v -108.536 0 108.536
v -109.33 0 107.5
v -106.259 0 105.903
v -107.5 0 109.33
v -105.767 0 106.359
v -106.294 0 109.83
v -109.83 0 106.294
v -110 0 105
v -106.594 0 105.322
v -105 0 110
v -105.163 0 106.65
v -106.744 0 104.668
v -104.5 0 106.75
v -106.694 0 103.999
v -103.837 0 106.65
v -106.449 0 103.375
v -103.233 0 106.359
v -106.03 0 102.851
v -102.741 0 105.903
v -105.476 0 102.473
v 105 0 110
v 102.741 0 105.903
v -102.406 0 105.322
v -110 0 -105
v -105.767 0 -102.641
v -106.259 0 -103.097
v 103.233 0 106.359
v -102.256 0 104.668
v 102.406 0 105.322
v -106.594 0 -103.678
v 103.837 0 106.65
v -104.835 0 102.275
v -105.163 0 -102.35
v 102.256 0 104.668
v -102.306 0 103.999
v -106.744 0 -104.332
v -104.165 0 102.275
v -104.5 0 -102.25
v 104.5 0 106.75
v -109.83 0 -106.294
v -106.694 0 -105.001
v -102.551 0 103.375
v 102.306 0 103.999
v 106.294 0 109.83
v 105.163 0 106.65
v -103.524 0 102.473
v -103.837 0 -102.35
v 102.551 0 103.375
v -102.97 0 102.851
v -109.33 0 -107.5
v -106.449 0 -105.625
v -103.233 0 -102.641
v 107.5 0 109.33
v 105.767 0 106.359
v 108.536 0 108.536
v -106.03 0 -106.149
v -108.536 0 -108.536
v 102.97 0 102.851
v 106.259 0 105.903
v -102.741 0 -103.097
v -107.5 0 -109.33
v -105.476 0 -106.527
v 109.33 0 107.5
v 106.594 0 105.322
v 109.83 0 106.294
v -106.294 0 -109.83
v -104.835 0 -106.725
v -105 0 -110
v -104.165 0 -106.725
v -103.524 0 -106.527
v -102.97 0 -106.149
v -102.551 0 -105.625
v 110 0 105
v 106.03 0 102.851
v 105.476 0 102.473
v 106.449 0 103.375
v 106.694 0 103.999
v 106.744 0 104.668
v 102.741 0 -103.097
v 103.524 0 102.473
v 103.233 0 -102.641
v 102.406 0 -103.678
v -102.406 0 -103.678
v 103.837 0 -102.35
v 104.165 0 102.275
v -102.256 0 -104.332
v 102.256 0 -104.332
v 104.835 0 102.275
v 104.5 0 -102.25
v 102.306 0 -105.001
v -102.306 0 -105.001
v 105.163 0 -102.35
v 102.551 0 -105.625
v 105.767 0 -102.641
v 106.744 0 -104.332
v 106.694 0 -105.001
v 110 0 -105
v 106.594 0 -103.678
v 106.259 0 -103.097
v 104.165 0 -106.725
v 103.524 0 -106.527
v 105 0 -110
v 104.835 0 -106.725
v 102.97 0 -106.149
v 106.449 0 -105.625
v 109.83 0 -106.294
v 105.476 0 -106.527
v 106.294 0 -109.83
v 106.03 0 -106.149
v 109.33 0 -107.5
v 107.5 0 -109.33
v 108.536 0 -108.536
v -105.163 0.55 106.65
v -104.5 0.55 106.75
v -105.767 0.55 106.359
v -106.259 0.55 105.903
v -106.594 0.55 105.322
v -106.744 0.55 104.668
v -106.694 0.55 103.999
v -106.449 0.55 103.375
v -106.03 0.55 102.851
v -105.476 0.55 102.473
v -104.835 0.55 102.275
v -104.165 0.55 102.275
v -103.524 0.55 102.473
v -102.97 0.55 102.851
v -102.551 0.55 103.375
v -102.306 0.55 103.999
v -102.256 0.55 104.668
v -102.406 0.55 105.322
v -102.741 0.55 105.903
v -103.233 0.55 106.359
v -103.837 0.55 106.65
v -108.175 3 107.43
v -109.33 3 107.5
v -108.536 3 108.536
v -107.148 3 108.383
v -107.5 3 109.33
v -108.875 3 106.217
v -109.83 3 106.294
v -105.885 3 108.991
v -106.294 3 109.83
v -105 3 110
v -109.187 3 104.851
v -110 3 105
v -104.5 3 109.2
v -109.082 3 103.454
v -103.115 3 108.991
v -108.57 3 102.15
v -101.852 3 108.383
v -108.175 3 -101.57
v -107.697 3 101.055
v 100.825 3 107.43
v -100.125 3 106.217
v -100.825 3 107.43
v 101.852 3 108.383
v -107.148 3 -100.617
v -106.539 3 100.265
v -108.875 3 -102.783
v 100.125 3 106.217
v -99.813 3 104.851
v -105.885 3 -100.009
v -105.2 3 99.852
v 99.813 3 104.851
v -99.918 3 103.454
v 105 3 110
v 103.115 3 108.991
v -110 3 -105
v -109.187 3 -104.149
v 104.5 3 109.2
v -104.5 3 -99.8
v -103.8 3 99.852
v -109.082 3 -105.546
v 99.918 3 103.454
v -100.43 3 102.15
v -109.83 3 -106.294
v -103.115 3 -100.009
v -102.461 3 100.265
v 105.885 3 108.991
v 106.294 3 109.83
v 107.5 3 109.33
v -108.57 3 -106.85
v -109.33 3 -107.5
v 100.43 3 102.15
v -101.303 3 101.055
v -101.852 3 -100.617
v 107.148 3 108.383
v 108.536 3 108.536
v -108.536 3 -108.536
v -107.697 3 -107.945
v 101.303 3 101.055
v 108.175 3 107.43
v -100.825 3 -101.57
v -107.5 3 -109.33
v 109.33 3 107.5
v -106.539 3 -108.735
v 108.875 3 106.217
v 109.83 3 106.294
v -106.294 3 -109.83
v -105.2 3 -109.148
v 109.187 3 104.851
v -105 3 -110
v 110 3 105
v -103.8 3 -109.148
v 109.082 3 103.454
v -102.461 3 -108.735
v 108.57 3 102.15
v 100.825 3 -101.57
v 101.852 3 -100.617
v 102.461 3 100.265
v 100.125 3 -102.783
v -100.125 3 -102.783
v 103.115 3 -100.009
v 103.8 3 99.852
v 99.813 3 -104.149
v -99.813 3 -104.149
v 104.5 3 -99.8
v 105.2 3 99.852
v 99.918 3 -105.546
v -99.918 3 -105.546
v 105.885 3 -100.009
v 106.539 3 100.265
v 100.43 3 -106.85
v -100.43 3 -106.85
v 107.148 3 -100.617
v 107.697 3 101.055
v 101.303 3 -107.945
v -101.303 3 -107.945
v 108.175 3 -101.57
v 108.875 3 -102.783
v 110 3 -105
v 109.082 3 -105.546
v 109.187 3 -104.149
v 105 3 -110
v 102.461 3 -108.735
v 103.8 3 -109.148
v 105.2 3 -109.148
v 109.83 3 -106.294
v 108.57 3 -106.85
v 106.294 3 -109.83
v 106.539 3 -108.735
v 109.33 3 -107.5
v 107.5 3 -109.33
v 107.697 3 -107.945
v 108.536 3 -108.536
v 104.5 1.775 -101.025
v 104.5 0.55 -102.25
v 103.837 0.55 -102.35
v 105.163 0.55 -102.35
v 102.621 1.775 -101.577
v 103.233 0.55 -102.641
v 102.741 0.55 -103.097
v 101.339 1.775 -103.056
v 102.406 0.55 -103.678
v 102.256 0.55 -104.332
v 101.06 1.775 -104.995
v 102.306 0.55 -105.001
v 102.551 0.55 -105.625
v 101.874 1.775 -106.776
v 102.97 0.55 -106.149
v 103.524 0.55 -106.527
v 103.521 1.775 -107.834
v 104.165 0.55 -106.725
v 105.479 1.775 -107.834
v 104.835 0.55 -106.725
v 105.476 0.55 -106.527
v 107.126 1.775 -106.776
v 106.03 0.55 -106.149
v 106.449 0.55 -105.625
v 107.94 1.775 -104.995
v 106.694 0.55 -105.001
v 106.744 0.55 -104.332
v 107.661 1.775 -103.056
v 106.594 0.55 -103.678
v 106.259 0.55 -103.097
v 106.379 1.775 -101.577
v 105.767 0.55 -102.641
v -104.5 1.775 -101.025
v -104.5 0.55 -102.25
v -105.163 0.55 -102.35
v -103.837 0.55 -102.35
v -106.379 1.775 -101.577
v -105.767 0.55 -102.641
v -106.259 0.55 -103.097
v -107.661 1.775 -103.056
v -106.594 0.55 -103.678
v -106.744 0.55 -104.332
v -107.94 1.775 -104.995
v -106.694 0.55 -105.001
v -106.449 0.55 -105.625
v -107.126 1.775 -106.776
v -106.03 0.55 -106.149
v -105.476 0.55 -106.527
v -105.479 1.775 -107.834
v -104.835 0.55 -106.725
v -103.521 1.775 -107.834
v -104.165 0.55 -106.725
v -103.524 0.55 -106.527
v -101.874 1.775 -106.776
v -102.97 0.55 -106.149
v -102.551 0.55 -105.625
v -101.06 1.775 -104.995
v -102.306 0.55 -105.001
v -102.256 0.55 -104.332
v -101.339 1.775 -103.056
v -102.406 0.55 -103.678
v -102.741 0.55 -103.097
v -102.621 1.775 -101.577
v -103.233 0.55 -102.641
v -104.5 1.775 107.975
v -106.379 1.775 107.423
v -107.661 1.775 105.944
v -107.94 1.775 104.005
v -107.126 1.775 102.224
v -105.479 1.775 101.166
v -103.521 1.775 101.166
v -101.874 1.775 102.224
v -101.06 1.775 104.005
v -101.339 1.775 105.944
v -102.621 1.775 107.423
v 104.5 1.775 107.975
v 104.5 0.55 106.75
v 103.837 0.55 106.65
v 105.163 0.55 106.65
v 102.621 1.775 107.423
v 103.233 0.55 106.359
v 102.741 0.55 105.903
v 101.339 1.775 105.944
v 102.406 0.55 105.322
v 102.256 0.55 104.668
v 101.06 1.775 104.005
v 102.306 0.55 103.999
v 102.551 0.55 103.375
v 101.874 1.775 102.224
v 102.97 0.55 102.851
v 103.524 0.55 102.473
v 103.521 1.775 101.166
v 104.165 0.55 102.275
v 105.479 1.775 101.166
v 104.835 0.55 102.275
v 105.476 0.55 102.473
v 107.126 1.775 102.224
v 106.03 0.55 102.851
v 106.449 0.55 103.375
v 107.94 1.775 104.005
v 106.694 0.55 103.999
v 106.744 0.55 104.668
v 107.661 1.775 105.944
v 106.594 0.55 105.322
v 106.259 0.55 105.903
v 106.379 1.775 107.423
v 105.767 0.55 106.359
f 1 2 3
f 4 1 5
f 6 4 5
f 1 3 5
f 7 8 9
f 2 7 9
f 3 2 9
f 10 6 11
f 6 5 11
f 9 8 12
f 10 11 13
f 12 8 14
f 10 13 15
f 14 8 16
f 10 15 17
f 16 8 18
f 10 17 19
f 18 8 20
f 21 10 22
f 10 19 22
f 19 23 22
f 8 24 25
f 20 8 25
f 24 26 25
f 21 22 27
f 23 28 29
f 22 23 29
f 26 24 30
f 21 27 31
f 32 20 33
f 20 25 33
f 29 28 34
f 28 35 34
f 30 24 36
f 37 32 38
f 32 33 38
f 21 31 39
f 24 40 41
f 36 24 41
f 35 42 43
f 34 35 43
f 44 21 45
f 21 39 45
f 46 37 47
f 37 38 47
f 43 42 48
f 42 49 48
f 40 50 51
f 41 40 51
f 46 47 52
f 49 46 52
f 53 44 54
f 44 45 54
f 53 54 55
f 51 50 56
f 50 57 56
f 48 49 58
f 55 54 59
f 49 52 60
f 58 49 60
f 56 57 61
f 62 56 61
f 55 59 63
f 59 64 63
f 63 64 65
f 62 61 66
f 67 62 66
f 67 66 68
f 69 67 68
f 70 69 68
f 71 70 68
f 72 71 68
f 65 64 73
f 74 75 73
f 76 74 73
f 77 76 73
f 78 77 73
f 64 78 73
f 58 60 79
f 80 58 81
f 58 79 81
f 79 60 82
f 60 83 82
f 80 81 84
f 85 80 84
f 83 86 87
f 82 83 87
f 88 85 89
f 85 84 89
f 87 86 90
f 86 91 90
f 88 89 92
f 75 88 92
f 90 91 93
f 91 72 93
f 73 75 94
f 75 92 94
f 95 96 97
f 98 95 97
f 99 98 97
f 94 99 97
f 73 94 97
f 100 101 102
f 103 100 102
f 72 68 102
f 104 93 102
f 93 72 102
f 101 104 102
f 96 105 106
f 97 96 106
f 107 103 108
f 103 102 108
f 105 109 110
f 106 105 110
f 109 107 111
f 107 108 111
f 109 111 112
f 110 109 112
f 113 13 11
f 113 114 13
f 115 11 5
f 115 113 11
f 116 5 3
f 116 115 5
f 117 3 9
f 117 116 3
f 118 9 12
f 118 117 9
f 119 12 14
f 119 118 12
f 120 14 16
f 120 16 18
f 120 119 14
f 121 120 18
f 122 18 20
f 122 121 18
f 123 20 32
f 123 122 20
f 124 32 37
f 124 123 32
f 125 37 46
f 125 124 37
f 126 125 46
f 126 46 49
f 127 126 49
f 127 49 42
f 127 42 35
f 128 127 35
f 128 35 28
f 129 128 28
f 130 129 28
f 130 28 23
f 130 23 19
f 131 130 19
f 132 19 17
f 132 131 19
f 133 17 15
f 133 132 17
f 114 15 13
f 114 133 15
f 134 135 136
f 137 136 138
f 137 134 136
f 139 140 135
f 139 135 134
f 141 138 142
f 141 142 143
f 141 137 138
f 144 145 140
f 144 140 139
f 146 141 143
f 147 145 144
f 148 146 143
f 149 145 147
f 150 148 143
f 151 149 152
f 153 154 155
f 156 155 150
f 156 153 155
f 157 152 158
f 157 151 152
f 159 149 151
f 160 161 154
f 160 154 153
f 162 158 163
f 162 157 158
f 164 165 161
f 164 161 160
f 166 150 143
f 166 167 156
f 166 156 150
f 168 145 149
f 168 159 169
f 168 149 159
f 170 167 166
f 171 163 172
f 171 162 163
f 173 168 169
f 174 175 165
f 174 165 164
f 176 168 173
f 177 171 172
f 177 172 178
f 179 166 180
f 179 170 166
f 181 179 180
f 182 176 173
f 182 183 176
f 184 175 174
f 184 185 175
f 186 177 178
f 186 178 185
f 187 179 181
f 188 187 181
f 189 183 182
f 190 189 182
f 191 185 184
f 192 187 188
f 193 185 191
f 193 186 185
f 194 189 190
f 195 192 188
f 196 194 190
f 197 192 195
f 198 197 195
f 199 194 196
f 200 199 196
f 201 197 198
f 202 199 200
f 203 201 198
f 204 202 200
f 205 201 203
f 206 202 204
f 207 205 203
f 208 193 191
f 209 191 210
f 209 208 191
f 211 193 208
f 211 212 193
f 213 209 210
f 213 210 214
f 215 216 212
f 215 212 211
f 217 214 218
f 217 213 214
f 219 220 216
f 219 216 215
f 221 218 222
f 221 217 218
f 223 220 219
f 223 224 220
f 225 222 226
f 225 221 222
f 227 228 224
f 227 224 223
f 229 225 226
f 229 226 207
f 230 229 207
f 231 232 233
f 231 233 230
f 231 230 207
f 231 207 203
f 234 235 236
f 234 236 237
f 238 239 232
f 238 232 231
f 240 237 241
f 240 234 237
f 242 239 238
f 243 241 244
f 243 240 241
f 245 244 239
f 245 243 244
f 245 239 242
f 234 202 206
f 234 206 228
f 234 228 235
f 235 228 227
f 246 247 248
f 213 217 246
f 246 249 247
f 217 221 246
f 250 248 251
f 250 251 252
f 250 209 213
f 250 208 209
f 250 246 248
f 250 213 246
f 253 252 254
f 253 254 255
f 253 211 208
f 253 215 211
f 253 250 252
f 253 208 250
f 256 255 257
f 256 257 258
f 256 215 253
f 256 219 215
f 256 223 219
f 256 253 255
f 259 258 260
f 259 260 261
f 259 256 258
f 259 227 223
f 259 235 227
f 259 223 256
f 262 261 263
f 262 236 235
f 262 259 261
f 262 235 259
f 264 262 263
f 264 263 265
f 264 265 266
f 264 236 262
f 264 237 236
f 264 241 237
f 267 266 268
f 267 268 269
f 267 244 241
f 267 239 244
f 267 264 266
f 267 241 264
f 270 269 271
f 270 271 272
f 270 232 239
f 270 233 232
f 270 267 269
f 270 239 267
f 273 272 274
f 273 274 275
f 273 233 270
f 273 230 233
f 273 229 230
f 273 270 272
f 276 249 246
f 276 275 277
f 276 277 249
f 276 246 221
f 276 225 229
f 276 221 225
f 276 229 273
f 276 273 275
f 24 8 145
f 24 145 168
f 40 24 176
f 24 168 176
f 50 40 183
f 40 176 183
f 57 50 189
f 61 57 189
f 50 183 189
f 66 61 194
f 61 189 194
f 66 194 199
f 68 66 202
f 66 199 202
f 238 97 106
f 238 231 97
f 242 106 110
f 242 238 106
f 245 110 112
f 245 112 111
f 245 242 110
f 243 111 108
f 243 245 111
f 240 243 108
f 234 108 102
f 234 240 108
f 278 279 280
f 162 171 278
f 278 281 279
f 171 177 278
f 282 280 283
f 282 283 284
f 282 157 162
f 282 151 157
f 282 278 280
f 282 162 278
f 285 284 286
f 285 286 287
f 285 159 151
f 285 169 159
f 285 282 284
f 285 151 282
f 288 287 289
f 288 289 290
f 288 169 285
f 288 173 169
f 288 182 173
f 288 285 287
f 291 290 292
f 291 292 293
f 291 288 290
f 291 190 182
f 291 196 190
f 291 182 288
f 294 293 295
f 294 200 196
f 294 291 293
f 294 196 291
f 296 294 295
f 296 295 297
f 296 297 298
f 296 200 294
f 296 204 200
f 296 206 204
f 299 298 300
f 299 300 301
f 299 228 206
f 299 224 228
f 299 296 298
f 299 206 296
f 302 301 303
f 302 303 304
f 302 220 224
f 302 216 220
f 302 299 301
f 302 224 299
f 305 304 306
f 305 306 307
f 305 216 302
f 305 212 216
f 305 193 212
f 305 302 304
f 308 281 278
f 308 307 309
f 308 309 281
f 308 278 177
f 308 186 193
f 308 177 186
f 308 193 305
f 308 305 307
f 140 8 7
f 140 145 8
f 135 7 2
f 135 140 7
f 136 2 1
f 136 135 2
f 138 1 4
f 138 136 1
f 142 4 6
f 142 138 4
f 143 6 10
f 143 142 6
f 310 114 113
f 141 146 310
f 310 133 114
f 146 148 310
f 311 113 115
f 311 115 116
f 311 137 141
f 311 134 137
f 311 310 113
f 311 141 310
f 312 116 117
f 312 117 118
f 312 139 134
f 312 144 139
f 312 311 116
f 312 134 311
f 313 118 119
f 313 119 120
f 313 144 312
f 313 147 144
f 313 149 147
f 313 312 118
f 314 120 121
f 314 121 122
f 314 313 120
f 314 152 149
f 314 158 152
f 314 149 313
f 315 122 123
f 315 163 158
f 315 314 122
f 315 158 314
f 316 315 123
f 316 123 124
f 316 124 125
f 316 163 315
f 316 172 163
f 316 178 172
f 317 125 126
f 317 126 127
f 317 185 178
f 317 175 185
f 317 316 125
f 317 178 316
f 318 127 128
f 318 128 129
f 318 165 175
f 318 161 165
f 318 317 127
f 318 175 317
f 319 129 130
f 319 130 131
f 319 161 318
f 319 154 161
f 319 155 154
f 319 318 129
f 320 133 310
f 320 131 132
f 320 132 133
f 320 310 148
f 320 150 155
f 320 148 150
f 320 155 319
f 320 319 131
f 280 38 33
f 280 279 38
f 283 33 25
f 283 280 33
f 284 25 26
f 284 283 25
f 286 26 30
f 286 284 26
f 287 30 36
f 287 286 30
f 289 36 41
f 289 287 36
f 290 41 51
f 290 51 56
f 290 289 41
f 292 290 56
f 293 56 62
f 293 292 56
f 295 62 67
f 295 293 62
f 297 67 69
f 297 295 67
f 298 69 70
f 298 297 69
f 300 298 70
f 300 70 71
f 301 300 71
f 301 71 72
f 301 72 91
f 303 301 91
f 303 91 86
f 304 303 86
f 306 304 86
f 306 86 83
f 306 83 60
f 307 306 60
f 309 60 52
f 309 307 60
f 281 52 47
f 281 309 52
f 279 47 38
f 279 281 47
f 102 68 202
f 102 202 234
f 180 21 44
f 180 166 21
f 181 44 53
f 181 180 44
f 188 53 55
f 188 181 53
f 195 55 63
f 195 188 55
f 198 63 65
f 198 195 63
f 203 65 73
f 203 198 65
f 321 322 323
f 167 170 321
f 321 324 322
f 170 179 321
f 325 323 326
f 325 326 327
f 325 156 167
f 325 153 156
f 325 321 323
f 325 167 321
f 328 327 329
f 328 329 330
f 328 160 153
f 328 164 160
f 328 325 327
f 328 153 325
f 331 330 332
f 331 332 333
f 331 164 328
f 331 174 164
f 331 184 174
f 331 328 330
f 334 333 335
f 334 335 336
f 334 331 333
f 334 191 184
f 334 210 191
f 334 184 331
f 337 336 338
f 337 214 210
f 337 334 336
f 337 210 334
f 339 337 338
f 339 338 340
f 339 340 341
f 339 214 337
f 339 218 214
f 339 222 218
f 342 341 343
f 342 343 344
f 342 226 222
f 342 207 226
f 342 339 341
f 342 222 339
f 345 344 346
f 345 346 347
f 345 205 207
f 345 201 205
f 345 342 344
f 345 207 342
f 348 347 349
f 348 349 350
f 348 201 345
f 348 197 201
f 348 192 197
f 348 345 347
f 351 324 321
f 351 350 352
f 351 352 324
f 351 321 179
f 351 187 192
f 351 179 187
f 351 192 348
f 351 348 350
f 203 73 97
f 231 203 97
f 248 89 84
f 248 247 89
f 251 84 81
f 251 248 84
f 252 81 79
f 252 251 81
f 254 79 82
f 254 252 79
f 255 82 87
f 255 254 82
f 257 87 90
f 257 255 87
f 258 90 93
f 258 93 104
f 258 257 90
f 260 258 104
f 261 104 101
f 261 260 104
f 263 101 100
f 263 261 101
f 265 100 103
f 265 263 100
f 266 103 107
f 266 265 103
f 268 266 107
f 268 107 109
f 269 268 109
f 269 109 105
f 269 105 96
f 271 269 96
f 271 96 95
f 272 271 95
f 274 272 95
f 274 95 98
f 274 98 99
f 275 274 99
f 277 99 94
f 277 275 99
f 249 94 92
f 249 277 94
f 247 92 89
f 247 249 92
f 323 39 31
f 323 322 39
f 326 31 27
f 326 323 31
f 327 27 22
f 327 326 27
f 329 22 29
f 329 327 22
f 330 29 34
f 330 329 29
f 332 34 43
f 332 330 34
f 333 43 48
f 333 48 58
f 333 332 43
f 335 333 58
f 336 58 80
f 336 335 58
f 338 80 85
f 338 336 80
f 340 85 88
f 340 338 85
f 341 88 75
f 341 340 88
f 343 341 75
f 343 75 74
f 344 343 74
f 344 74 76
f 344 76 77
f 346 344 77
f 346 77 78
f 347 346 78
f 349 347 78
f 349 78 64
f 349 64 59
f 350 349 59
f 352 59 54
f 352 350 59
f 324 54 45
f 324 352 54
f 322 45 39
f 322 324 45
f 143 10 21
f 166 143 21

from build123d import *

# Parameters (mm, degrees)
SKETCH1_W                                    = 220
SKETCH1_H                                    = 220
BOSS_EXTRUDE1_DEPTH                          = 3
FILLET1_R                                    = 5
CSK_FOR_M4_COUNTERSUNK_FLAT_HEAD_SCR_2_COUNT = 2
CSK_FOR_M4_COUNTERSUNK_FLAT_HEAD_SCR_2_PITCH = 209
CSK_FOR_M4_COUNTERSUNK_FLAT_HEAD_SCR_3_COUNT = 2
CSK_FOR_M4_COUNTERSUNK_FLAT_HEAD_SCR_3_PITCH = 209
CSK_FOR_M4_COUNTERSUNK_FLAT_HEAD_SCR_4_COUNT = 2
CSK_FOR_M4_COUNTERSUNK_FLAT_HEAD_SCR_4_PITCH = 295.570634536


with BuildPart() as part:
    # Sketch1 → Boss-Extrude1 (new body)
    with BuildSketch(Plane(origin=(0, 0, 0), x_dir=(1, 0, 0), z_dir=(0, 1, 0))):
        Rectangle(SKETCH1_W, SKETCH1_H)
    extrude(amount=BOSS_EXTRUDE1_DEPTH)

    # Fillet1
    fillet1_edges = [part.edges().sort_by_distance(p)[0] for p in [
        (110, 1.5, 110),
        (-110, 1.5, 110),
        (-110, 1.5, -110),
        (110, 1.5, -110),
    ]]
    fillet(fillet1_edges, radius=FILLET1_R)

    # Sketch4 → CSK for M4 Countersunk Flat Head Screw1 (revolve, cut)
    with BuildSketch(Plane(origin=(-104.5, 3, -104.5), x_dir=(0, 0, 1), z_dir=(1, 0, 0))):
        Polygon((0, 0), (0, 3), (2.25, 3), (2.25, 2.45), (4.7, 0), align=None)
    csk_for_m4_countersunk_flat_head_screw1 = revolve(axis=Axis((-104.5, 9.35, -104.5), (0, -1, 0)), mode=Mode.SUBTRACT)

    # CSK for M4 Countersunk Flat Head Scr 2: CSK for M4 Countersunk Flat Head Screw1 ×2
    with Locations(*[(i * CSK_FOR_M4_COUNTERSUNK_FLAT_HEAD_SCR_2_PITCH, 0, 0) for i in range(1, CSK_FOR_M4_COUNTERSUNK_FLAT_HEAD_SCR_2_COUNT)]):
        add(csk_for_m4_countersunk_flat_head_screw1, mode=Mode.SUBTRACT)

    # CSK for M4 Countersunk Flat Head Scr 3: CSK for M4 Countersunk Flat Head Screw1 ×2
    with Locations(*[(0, 0, i * CSK_FOR_M4_COUNTERSUNK_FLAT_HEAD_SCR_3_PITCH) for i in range(1, CSK_FOR_M4_COUNTERSUNK_FLAT_HEAD_SCR_3_COUNT)]):
        add(csk_for_m4_countersunk_flat_head_screw1, mode=Mode.SUBTRACT)

    # CSK for M4 Countersunk Flat Head Scr 4: CSK for M4 Countersunk Flat Head Screw1 ×2
    with Locations(*[Vector(0.707106781, 0, 0.707106781) * (i * CSK_FOR_M4_COUNTERSUNK_FLAT_HEAD_SCR_4_PITCH) for i in range(1, CSK_FOR_M4_COUNTERSUNK_FLAT_HEAD_SCR_4_COUNT)]):
        add(csk_for_m4_countersunk_flat_head_screw1, mode=Mode.SUBTRACT)


solid = part.part
